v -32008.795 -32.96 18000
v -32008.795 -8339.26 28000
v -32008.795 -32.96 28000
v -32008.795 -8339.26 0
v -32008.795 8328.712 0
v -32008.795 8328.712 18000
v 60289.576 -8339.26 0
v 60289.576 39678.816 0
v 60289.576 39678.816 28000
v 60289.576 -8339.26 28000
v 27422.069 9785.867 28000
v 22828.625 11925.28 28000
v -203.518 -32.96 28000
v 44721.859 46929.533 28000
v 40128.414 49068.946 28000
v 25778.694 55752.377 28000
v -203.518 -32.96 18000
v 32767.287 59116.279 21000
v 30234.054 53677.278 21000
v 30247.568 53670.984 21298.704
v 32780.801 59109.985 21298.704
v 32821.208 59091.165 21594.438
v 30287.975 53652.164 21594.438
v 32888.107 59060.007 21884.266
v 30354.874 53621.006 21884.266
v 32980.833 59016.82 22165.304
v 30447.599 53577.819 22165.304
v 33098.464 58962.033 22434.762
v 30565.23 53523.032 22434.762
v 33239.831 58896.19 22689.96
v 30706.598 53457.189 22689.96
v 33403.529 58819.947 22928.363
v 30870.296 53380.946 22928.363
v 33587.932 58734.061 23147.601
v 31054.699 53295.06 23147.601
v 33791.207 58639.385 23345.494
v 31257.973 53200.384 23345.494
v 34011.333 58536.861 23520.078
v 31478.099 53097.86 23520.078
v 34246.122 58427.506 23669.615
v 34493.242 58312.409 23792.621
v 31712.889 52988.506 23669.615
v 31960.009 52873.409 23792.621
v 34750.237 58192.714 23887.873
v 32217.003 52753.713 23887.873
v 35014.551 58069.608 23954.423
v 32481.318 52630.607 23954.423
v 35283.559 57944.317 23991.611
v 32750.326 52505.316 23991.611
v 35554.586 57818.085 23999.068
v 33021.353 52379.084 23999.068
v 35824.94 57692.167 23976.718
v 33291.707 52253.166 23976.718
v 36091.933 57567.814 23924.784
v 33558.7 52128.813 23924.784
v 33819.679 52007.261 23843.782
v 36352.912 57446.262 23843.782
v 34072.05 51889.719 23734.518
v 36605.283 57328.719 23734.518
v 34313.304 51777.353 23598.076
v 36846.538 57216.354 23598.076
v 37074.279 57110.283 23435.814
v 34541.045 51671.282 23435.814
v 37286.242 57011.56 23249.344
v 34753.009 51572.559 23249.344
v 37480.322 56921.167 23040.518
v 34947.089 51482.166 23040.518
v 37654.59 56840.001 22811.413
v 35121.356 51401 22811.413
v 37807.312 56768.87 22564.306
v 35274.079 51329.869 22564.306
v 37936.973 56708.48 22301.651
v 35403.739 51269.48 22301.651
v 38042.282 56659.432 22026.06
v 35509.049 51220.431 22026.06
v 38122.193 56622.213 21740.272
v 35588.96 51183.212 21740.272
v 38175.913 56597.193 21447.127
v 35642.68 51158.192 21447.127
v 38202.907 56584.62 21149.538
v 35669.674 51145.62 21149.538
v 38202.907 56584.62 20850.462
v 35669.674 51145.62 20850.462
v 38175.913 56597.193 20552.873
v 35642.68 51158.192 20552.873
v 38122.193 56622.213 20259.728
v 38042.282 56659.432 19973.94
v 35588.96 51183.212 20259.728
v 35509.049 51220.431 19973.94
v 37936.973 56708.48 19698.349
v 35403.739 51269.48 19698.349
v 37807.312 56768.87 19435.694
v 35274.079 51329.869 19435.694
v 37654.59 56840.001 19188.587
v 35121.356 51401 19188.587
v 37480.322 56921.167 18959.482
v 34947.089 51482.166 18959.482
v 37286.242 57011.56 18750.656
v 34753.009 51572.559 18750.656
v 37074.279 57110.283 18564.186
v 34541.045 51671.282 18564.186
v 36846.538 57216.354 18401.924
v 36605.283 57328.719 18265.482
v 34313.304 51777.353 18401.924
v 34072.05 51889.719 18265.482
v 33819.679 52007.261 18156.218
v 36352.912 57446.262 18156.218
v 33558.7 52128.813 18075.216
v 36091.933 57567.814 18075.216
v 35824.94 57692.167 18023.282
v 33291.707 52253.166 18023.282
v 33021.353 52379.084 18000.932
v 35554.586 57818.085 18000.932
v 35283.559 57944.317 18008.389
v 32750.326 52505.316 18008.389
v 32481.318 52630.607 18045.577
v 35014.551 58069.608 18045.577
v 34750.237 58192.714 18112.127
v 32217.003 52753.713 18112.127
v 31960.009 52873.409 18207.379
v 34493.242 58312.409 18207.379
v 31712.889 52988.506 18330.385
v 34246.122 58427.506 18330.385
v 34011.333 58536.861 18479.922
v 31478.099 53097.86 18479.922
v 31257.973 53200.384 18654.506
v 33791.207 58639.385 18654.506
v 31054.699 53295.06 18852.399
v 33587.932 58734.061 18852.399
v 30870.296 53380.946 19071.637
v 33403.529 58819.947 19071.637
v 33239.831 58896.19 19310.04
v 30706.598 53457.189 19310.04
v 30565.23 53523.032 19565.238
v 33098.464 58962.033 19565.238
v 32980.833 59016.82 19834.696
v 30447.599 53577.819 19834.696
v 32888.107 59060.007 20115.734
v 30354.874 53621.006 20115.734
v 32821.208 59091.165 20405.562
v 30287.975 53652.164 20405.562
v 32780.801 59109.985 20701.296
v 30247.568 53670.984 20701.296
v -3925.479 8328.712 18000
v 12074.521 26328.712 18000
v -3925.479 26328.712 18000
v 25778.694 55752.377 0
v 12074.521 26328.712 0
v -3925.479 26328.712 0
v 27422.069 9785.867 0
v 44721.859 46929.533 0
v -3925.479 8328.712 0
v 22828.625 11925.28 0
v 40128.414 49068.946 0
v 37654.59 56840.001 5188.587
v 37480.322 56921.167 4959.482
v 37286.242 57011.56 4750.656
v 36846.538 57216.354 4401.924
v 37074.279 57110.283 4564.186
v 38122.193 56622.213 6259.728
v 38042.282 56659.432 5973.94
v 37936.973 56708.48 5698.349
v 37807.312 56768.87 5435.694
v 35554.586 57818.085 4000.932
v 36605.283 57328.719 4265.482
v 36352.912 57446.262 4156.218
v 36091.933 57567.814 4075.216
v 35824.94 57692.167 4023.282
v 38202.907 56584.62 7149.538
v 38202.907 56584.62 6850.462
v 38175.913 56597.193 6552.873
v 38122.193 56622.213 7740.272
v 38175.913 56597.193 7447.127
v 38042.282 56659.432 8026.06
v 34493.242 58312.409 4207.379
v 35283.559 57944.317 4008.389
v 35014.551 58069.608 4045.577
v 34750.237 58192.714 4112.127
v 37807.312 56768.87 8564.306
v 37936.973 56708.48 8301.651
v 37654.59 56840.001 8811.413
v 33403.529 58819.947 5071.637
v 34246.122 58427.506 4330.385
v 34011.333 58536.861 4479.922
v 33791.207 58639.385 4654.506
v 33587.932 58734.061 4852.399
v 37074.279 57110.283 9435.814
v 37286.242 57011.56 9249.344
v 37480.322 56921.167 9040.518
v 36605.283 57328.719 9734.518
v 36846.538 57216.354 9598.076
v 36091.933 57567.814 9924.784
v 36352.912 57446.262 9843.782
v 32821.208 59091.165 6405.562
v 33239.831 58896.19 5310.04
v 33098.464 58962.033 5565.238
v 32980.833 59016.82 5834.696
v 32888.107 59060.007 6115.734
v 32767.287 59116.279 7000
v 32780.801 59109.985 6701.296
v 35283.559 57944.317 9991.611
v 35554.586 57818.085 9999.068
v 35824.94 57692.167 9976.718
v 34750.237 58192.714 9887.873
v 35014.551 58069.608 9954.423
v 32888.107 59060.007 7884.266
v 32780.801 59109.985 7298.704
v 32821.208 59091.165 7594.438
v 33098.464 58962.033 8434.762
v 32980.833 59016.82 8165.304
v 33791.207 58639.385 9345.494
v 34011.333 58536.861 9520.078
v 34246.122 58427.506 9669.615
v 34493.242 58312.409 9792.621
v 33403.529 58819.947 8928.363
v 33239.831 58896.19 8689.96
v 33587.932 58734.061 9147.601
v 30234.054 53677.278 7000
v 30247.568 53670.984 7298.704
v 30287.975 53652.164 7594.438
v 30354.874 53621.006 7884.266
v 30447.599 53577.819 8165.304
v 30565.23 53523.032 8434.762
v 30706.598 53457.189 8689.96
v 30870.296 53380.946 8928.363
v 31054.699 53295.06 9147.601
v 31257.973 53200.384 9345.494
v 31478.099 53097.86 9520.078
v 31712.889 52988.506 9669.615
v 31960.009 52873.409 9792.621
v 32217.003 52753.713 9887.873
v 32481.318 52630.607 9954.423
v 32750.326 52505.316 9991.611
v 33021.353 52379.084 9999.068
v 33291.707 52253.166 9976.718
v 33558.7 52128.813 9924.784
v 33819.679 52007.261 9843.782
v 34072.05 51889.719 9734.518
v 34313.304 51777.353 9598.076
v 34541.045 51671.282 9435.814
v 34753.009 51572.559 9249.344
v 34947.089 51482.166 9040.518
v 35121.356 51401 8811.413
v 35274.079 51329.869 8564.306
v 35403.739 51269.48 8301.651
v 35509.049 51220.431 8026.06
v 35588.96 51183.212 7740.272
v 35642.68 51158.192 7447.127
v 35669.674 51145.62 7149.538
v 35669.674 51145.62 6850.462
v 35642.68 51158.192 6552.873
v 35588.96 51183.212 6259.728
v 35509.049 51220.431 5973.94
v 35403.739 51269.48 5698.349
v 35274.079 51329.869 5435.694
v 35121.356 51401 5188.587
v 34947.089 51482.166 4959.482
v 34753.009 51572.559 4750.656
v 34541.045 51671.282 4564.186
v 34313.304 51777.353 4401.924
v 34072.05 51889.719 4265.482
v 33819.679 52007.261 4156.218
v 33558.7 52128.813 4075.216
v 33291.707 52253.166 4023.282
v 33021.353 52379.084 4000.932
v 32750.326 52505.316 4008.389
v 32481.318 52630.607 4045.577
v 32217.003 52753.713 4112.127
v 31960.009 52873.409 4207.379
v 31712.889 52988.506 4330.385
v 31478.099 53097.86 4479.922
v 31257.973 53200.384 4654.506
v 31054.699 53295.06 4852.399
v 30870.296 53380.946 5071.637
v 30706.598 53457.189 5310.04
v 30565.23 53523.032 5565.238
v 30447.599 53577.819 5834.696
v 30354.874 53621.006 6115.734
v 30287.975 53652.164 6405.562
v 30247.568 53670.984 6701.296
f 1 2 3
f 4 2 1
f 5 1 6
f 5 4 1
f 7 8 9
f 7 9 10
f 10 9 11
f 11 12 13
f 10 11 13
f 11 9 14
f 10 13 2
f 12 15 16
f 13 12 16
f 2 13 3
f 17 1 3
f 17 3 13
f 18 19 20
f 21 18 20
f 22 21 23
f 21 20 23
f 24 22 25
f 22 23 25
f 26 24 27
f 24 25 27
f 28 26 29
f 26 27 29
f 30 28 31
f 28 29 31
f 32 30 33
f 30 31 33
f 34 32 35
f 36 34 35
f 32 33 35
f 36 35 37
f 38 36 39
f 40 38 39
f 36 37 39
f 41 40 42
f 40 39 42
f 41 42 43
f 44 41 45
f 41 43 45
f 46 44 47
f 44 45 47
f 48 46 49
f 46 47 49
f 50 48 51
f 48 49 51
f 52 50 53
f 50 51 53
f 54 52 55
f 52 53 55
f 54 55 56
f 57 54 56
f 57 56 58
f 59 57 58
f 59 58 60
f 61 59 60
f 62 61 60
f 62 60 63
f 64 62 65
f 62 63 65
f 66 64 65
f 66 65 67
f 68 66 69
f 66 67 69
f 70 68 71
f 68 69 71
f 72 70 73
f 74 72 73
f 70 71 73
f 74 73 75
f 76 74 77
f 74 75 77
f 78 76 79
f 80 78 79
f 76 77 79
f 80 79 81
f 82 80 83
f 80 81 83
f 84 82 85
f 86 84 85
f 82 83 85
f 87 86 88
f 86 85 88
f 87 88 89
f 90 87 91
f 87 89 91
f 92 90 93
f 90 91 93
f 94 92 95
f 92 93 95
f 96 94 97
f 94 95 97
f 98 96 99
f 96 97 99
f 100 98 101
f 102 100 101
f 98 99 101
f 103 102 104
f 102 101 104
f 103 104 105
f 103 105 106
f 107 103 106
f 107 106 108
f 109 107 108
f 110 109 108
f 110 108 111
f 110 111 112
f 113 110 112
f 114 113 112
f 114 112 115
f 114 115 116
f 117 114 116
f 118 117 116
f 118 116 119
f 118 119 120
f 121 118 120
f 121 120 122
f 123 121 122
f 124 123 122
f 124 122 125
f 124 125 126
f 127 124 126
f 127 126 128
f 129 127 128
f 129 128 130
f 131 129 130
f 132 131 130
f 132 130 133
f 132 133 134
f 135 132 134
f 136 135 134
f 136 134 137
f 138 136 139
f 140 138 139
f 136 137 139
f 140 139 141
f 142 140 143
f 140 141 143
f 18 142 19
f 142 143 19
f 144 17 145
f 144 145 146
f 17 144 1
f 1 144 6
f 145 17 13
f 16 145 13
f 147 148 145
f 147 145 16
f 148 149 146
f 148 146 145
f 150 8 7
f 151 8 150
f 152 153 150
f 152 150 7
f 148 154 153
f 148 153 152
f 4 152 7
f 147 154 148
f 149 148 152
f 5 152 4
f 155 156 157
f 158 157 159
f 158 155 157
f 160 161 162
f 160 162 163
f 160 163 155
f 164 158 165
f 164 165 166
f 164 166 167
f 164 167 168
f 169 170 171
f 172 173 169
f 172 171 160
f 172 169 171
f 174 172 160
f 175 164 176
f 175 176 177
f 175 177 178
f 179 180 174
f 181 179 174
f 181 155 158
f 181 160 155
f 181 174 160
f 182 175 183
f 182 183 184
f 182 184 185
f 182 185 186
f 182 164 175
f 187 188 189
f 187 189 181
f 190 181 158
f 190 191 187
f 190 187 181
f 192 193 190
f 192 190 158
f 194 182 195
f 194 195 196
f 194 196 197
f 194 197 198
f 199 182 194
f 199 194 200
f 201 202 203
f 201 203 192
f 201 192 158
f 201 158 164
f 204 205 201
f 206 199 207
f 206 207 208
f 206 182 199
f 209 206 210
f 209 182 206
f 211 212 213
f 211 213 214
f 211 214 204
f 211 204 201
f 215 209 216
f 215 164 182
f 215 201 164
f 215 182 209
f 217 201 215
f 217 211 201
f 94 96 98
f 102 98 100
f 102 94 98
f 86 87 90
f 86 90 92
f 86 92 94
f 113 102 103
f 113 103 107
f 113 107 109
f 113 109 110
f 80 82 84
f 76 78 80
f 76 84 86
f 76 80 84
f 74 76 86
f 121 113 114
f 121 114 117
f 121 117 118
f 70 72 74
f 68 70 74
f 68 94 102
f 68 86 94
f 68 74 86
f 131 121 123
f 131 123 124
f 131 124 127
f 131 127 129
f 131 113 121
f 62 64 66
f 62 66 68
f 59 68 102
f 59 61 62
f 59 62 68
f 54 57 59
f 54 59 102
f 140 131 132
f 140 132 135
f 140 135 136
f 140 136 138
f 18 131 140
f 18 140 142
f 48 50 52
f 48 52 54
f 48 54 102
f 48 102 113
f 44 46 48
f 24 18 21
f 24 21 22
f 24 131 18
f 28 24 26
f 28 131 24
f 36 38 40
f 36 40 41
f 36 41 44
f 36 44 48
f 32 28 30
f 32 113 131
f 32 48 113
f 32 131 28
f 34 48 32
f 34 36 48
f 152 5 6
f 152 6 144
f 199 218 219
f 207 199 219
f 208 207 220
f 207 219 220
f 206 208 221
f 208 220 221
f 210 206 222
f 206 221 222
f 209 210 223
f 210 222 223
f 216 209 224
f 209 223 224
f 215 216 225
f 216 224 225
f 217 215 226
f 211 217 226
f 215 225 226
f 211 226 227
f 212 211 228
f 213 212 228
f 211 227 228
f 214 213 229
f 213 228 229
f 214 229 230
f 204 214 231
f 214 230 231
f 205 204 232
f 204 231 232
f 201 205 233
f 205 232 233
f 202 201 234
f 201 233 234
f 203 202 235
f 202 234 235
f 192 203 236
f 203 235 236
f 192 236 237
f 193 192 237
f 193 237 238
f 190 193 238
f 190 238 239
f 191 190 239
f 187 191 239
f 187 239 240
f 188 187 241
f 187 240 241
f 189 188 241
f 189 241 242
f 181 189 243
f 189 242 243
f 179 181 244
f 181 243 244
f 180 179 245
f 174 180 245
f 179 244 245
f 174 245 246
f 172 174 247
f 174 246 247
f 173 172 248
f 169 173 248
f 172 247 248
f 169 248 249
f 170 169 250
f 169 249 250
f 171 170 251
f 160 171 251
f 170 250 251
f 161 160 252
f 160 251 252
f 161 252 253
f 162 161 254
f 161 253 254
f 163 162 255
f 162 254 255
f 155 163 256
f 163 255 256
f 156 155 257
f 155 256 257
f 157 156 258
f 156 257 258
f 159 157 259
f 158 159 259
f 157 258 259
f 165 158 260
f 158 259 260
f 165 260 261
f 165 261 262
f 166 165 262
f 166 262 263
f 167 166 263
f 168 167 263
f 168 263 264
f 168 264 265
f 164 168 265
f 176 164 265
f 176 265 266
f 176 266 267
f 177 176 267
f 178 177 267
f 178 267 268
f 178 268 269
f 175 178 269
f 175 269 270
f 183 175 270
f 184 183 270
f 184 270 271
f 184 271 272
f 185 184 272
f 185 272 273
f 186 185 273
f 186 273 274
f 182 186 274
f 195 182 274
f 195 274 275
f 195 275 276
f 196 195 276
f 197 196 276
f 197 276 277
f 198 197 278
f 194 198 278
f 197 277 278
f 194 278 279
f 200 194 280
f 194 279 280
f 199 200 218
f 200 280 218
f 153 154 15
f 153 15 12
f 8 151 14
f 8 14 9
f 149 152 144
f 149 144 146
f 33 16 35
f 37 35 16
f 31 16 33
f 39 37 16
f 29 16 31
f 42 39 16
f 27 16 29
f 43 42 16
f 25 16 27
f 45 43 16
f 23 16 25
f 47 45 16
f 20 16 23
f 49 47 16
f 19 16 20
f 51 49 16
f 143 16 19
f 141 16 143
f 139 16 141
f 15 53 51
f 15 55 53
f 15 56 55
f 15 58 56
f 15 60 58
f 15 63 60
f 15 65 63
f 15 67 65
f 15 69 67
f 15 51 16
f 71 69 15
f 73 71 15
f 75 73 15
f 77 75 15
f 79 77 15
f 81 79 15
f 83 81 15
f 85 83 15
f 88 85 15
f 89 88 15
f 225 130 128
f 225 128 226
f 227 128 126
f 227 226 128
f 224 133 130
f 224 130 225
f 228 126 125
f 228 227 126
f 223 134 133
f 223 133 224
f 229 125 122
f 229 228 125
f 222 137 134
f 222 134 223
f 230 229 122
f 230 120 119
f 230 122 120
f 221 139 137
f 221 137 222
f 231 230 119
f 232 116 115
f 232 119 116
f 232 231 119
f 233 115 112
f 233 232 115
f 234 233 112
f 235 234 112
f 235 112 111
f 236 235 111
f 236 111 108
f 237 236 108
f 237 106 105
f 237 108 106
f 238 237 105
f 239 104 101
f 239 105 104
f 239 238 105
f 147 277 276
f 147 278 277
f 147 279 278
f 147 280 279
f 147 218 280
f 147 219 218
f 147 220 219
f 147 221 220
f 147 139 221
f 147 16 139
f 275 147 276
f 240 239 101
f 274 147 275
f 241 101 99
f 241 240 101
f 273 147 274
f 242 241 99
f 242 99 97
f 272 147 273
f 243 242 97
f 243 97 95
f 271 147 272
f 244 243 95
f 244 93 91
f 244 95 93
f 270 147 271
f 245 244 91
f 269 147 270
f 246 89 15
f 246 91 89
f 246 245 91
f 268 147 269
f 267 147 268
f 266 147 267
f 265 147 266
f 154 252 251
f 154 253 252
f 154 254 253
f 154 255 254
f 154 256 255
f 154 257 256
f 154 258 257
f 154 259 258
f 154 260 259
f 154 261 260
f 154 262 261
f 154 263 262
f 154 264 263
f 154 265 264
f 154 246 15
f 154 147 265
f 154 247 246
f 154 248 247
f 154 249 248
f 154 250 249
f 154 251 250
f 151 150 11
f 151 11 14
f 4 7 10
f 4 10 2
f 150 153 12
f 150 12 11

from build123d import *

# Parameters (mm, degrees)
BOSS_EXTRUDE3_DEPTH = 28000
BOSS_EXTRUDE4_DEPTH = 18000
SKETCH7_R           = 3000
BOSS_EXTRUDE6_DEPTH = 6000


with BuildPart() as part:
    # Sketch1 → Boss-Extrude3 (new body)
    with BuildSketch(Plane.XY):
        Polygon((60289.575671437, -8339.25974013), (-32008.795270492, -8339.25974013), (-32008.795270492, -32.960143443), (-203.517816426, -32.960143443), (25778.694164292, 55752.377344568), (40128.414231199, 49068.946080529), (22828.624558736, 11925.280019065), (27422.069474156, 9785.867318732), (44721.859146619, 46929.533380197), (60289.575671437, 39678.816094665), align=None)
    extrude(amount=BOSS_EXTRUDE3_DEPTH)

    # Sketch4 → Boss-Extrude4 (add)
    with BuildSketch(Plane.XY):
        Polygon((-32008.795270492, -32.960143443), (-32008.795270492, 8328.712203679), (-3925.478641054, 8328.712203679), (-3925.478641054, 26328.712203679), (12074.521358946, 26328.712203679), (-203.517816426, -32.960143443), align=None)
    extrude(amount=BOSS_EXTRUDE4_DEPTH)

    # Sketch7 → Boss-Extrude6 (add)
    with BuildSketch(Plane(origin=(25933.31858491, 55680.360491129, 0), x_dir=(0.9065001283244669, -0.4222055392196143, 0), z_dir=(0.4222055392196143, 0.9065001283244669, 0))):
        with Locations(Location((7744.3294198, -21000, 0), (0, 0, 180))):
            Circle(SKETCH7_R)
        with Locations(Location((7744.3294198, -7000, 0), (0, 0, 180))):
            Circle(SKETCH7_R)
    extrude(amount=BOSS_EXTRUDE6_DEPTH)


solid = part.part
